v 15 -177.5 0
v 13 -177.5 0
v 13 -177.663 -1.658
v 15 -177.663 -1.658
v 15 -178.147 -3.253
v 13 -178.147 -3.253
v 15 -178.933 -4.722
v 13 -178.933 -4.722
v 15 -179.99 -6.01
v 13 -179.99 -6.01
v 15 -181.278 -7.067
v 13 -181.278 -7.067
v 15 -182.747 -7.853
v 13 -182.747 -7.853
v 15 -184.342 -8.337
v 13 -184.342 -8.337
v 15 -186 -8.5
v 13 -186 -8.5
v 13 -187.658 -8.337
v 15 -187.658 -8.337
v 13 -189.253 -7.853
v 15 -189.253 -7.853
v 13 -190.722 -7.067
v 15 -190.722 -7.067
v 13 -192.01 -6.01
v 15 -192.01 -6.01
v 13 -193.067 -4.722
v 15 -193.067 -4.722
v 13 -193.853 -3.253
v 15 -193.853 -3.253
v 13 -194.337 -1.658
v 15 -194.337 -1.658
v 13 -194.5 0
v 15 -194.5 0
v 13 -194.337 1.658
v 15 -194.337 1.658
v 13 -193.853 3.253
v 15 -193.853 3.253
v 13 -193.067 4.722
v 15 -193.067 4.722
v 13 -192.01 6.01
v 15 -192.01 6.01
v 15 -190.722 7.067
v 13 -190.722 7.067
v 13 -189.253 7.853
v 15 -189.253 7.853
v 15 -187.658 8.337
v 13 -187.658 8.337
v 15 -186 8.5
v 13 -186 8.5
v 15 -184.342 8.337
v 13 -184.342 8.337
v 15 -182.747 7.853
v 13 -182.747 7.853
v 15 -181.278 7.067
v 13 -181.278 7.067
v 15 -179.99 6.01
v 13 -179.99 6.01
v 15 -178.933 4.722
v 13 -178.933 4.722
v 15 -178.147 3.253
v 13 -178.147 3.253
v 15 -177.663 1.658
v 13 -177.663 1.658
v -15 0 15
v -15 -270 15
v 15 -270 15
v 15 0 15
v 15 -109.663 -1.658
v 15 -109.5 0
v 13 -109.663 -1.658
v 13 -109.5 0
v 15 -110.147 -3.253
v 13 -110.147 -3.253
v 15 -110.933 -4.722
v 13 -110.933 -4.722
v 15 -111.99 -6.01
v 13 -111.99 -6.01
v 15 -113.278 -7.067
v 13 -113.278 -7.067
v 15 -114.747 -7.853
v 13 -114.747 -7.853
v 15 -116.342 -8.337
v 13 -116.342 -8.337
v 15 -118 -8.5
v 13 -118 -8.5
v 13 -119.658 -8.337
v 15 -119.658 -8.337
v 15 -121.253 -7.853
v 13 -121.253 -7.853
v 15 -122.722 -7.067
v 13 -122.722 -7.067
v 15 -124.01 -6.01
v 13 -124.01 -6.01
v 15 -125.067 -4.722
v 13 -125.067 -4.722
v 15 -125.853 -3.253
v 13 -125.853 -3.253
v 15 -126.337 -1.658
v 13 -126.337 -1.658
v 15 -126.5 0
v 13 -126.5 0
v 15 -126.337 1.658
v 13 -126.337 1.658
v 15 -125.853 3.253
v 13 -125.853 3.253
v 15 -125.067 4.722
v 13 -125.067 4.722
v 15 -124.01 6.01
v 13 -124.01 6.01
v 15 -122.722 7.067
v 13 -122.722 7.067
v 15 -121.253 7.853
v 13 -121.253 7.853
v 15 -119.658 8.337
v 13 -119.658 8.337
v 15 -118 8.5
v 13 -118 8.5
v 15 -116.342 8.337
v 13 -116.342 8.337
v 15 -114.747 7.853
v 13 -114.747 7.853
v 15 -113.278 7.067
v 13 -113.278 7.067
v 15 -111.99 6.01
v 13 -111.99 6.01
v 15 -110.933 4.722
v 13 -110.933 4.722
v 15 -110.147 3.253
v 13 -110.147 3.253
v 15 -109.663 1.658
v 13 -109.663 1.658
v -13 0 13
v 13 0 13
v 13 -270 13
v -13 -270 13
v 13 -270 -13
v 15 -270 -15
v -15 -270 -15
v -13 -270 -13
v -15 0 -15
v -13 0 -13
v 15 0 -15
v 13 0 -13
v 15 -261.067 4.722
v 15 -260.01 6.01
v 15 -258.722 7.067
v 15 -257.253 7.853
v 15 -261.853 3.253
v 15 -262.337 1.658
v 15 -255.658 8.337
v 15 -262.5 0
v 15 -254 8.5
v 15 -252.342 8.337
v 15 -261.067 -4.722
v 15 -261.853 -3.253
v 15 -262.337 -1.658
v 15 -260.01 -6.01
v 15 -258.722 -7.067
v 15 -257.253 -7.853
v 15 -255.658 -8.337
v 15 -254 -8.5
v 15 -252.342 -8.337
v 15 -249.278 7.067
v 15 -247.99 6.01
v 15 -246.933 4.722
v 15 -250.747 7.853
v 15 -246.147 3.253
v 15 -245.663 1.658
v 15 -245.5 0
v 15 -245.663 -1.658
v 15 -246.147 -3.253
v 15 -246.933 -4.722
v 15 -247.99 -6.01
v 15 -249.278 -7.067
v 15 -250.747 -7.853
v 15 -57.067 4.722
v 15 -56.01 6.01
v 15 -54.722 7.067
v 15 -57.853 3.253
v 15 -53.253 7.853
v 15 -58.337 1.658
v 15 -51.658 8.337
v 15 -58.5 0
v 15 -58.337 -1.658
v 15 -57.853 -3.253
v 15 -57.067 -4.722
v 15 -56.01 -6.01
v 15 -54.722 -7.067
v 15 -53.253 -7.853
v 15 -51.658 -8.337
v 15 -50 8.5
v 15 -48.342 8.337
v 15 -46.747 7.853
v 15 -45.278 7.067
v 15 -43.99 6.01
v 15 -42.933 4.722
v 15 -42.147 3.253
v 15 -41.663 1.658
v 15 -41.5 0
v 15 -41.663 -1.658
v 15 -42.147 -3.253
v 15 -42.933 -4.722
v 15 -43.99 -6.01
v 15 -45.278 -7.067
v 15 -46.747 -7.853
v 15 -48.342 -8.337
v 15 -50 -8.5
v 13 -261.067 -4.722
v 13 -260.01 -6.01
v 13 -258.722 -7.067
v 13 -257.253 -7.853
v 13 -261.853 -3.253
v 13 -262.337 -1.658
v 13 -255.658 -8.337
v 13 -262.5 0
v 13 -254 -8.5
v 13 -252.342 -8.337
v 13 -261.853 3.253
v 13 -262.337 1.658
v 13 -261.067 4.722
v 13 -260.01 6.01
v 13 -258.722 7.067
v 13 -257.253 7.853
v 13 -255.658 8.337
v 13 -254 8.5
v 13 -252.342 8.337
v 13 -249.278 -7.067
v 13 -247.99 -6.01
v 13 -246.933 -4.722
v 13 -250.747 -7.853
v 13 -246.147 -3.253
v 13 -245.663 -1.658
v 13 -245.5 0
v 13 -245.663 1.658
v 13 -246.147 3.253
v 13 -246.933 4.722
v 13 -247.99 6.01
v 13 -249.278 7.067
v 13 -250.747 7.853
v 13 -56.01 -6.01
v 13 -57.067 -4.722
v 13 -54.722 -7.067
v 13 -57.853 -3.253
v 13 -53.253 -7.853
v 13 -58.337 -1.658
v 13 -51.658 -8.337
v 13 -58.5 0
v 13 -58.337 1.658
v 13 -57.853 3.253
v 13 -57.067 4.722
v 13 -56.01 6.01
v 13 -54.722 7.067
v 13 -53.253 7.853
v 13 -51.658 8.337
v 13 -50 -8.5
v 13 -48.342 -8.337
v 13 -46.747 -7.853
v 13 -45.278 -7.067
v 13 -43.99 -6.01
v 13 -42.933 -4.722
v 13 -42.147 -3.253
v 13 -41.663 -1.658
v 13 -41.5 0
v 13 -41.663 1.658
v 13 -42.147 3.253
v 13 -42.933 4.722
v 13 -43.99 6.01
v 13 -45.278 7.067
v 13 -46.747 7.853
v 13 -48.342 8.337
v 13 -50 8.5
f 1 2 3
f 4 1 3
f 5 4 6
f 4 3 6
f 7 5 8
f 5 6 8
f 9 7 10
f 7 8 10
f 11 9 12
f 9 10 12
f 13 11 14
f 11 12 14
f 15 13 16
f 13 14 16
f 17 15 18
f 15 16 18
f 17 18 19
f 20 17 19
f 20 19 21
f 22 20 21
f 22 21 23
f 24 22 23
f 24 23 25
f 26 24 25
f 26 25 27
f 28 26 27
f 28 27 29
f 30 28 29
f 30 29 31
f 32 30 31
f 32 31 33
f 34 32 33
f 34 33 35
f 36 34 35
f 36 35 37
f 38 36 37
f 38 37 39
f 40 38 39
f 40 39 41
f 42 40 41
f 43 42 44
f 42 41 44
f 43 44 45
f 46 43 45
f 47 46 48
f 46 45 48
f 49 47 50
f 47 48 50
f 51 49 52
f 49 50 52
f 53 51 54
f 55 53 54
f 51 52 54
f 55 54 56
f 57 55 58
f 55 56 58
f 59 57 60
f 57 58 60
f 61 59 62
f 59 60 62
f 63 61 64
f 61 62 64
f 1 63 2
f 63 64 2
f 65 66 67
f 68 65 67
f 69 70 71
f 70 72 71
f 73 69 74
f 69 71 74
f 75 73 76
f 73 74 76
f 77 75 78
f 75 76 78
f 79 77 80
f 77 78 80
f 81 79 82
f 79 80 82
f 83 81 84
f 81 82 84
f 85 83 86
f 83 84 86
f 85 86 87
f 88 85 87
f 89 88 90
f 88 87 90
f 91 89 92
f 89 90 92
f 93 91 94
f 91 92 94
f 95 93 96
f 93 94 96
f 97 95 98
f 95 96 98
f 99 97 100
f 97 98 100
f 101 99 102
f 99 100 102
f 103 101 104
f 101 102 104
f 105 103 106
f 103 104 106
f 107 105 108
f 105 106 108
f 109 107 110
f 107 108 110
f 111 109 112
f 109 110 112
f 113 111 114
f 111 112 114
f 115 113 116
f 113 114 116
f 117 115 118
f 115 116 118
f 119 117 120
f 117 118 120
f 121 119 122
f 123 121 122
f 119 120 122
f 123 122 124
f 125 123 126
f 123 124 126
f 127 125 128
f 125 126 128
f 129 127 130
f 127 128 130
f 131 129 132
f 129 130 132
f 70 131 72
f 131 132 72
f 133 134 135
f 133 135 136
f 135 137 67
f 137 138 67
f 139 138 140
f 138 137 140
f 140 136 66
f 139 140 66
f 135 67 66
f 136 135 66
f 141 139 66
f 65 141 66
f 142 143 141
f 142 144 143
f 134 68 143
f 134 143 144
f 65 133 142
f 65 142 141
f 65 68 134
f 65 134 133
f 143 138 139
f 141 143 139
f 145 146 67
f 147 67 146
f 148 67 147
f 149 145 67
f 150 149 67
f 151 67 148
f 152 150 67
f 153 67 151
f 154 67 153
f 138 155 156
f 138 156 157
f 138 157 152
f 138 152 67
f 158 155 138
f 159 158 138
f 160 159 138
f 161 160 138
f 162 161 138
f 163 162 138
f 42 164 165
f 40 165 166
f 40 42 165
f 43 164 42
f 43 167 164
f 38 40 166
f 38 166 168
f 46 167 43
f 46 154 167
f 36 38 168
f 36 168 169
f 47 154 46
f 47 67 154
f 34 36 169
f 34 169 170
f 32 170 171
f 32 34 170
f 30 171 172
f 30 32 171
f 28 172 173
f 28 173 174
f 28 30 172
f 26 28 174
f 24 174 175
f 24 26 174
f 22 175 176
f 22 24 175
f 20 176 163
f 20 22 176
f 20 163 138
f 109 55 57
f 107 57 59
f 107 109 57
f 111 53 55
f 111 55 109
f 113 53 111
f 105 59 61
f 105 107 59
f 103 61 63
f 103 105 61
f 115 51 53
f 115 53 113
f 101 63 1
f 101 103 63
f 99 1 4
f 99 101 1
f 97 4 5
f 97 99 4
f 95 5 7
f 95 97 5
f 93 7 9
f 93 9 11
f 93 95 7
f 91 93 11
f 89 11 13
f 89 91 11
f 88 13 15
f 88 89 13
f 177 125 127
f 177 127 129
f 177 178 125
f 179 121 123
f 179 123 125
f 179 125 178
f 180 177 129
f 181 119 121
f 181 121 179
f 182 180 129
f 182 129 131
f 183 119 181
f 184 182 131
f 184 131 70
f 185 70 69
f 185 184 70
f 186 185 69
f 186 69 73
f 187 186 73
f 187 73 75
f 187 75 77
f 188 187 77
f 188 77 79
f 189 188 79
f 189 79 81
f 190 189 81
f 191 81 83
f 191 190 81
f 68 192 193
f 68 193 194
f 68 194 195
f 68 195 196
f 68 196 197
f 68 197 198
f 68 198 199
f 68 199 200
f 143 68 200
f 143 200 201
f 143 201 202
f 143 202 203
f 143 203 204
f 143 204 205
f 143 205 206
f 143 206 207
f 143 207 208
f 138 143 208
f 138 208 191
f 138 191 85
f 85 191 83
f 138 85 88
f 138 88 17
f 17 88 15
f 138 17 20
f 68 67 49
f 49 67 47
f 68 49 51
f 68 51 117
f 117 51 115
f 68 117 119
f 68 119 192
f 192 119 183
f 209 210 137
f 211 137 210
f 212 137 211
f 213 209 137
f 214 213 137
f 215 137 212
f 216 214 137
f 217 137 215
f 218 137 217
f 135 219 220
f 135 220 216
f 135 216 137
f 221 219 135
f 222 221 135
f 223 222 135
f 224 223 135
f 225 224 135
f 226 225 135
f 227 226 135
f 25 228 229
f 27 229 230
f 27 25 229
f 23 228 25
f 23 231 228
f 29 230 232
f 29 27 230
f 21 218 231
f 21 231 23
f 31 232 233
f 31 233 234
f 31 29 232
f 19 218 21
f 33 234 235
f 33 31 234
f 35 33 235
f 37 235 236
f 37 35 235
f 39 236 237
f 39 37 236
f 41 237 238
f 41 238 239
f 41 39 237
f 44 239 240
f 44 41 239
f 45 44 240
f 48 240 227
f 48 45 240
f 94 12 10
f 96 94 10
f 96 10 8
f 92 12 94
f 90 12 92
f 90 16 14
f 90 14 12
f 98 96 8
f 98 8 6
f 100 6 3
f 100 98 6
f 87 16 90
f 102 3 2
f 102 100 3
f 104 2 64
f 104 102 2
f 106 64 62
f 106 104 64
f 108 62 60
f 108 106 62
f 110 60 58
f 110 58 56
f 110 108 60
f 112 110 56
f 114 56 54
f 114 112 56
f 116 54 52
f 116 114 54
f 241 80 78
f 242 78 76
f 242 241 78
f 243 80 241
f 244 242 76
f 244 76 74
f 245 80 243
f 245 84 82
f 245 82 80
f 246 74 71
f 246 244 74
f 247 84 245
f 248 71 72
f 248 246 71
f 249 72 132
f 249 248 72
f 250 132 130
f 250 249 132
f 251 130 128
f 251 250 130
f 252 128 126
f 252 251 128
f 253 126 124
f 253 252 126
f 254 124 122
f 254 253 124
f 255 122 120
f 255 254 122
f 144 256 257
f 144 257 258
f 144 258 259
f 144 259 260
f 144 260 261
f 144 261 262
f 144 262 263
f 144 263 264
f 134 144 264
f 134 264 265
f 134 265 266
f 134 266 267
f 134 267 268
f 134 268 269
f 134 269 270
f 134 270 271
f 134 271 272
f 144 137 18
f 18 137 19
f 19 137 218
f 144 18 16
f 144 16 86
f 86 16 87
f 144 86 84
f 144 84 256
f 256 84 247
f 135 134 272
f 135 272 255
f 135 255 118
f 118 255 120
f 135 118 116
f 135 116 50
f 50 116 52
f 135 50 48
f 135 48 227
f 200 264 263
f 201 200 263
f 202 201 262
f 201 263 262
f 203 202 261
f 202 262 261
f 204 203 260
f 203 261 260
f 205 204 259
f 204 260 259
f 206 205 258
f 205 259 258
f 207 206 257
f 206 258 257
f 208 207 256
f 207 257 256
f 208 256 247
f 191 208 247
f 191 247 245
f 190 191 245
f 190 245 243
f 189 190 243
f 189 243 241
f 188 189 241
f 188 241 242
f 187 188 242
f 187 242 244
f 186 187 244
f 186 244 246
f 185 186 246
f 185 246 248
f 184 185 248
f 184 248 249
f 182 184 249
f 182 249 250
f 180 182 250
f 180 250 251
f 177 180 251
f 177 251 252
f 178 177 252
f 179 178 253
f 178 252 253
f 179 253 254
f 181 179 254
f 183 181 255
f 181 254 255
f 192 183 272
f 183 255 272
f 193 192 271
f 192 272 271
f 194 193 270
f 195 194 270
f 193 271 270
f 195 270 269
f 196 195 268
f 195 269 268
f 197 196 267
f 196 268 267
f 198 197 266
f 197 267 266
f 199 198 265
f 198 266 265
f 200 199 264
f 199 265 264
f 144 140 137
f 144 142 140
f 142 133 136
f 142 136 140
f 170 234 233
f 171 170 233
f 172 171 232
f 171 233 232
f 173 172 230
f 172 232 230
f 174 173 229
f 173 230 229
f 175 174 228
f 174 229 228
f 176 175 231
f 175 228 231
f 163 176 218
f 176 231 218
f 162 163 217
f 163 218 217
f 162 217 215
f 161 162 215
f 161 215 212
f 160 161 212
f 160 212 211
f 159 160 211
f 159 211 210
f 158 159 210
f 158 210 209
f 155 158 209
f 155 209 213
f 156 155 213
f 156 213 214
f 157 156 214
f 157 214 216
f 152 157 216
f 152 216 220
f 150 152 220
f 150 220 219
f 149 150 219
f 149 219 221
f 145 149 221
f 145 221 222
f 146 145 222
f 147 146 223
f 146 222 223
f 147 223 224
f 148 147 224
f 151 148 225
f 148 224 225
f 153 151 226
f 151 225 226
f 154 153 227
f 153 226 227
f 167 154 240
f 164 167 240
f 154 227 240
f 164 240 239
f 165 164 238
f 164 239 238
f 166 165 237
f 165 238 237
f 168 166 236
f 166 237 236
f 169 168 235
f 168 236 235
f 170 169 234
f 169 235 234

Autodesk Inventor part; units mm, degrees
ref_plane "YZ Plane" through (0, 0, 0) normal (1, 0, 0) x (0, 1, 0)
ref_plane "XZ Plane" through (0, 0, 0) normal (0, 1, 0) x (-1, 0, 0)
ref_plane "XY Plane" through (0, 0, 0) normal (0, 0, 1) x (1, 0, 0)
sketch "Sketch9" plane through (0, 0, 0) normal (0, 1, 0) x (-1, 0, 0)
  line L0 (15, 15) -> (-15, 15)
  line L1 (-15, 15) -> (-15, -15)
  line L2 (-15, -15) -> (15, -15)
  line L3 (15, -15) -> (15, 15)
  line L4 (15, 15) -> (-15, -15) construction
  line L5 (-15, 15) -> (15, -15) construction
  line L6 (-13, 13) -> (13, 13)
  line L7 (13, 13) -> (13, -13)
  line L8 (13, -13) -> (-13, -13)
  line L9 (-13, -13) -> (-13, 13)
  point P0 (0, 0)
  dimension "d172" = 30
  dimension "d173" = 30
  dimension "d174" = 2
extrude "Extrusion3" add sketch "Sketch9" against normal blind 270
sketch "Sketch10" plane through (0, 0, 0) normal (1, 0, 0) x (0, 1, 0)
  line L0 (0, 15) -> (0, -15) construction
  line L1 (0, 15) -> (-270, 15) construction
  line L2 (0, -15) -> (-270, -15) construction
  line L3 (-58.5, 8.5) -> (-41.5, 8.5)
  line L4 (-41.5, 8.5) -> (-41.5, -8.5)
  line L5 (-41.5, -8.5) -> (-58.5, -8.5)
  line L6 (-58.5, -8.5) -> (-58.5, 8.5)
  line L7 (-58.5, 8.5) -> (-41.5, -8.5) construction
  line L8 (-41.5, 8.5) -> (-58.5, -8.5) construction
  line L9 (0, 0) -> (30, 0)
  circle A0 centre (-50, 0) radius 8.5
  dimension "d177" = 17
  dimension "d178" = 17
  dimension "d181" = 30
  dimension "d182" = 80
extrude "Extrusion4" cut sketch "Sketch10" along normal through all contours A0
pattern_linear "Rectangular Pattern4" count 4 spacing 68 along (0, -1, 0) of "Extrusion4"
properties part number "PRS 1200-56 FDS 1000 way tube 4" material "Stainless Steel"
